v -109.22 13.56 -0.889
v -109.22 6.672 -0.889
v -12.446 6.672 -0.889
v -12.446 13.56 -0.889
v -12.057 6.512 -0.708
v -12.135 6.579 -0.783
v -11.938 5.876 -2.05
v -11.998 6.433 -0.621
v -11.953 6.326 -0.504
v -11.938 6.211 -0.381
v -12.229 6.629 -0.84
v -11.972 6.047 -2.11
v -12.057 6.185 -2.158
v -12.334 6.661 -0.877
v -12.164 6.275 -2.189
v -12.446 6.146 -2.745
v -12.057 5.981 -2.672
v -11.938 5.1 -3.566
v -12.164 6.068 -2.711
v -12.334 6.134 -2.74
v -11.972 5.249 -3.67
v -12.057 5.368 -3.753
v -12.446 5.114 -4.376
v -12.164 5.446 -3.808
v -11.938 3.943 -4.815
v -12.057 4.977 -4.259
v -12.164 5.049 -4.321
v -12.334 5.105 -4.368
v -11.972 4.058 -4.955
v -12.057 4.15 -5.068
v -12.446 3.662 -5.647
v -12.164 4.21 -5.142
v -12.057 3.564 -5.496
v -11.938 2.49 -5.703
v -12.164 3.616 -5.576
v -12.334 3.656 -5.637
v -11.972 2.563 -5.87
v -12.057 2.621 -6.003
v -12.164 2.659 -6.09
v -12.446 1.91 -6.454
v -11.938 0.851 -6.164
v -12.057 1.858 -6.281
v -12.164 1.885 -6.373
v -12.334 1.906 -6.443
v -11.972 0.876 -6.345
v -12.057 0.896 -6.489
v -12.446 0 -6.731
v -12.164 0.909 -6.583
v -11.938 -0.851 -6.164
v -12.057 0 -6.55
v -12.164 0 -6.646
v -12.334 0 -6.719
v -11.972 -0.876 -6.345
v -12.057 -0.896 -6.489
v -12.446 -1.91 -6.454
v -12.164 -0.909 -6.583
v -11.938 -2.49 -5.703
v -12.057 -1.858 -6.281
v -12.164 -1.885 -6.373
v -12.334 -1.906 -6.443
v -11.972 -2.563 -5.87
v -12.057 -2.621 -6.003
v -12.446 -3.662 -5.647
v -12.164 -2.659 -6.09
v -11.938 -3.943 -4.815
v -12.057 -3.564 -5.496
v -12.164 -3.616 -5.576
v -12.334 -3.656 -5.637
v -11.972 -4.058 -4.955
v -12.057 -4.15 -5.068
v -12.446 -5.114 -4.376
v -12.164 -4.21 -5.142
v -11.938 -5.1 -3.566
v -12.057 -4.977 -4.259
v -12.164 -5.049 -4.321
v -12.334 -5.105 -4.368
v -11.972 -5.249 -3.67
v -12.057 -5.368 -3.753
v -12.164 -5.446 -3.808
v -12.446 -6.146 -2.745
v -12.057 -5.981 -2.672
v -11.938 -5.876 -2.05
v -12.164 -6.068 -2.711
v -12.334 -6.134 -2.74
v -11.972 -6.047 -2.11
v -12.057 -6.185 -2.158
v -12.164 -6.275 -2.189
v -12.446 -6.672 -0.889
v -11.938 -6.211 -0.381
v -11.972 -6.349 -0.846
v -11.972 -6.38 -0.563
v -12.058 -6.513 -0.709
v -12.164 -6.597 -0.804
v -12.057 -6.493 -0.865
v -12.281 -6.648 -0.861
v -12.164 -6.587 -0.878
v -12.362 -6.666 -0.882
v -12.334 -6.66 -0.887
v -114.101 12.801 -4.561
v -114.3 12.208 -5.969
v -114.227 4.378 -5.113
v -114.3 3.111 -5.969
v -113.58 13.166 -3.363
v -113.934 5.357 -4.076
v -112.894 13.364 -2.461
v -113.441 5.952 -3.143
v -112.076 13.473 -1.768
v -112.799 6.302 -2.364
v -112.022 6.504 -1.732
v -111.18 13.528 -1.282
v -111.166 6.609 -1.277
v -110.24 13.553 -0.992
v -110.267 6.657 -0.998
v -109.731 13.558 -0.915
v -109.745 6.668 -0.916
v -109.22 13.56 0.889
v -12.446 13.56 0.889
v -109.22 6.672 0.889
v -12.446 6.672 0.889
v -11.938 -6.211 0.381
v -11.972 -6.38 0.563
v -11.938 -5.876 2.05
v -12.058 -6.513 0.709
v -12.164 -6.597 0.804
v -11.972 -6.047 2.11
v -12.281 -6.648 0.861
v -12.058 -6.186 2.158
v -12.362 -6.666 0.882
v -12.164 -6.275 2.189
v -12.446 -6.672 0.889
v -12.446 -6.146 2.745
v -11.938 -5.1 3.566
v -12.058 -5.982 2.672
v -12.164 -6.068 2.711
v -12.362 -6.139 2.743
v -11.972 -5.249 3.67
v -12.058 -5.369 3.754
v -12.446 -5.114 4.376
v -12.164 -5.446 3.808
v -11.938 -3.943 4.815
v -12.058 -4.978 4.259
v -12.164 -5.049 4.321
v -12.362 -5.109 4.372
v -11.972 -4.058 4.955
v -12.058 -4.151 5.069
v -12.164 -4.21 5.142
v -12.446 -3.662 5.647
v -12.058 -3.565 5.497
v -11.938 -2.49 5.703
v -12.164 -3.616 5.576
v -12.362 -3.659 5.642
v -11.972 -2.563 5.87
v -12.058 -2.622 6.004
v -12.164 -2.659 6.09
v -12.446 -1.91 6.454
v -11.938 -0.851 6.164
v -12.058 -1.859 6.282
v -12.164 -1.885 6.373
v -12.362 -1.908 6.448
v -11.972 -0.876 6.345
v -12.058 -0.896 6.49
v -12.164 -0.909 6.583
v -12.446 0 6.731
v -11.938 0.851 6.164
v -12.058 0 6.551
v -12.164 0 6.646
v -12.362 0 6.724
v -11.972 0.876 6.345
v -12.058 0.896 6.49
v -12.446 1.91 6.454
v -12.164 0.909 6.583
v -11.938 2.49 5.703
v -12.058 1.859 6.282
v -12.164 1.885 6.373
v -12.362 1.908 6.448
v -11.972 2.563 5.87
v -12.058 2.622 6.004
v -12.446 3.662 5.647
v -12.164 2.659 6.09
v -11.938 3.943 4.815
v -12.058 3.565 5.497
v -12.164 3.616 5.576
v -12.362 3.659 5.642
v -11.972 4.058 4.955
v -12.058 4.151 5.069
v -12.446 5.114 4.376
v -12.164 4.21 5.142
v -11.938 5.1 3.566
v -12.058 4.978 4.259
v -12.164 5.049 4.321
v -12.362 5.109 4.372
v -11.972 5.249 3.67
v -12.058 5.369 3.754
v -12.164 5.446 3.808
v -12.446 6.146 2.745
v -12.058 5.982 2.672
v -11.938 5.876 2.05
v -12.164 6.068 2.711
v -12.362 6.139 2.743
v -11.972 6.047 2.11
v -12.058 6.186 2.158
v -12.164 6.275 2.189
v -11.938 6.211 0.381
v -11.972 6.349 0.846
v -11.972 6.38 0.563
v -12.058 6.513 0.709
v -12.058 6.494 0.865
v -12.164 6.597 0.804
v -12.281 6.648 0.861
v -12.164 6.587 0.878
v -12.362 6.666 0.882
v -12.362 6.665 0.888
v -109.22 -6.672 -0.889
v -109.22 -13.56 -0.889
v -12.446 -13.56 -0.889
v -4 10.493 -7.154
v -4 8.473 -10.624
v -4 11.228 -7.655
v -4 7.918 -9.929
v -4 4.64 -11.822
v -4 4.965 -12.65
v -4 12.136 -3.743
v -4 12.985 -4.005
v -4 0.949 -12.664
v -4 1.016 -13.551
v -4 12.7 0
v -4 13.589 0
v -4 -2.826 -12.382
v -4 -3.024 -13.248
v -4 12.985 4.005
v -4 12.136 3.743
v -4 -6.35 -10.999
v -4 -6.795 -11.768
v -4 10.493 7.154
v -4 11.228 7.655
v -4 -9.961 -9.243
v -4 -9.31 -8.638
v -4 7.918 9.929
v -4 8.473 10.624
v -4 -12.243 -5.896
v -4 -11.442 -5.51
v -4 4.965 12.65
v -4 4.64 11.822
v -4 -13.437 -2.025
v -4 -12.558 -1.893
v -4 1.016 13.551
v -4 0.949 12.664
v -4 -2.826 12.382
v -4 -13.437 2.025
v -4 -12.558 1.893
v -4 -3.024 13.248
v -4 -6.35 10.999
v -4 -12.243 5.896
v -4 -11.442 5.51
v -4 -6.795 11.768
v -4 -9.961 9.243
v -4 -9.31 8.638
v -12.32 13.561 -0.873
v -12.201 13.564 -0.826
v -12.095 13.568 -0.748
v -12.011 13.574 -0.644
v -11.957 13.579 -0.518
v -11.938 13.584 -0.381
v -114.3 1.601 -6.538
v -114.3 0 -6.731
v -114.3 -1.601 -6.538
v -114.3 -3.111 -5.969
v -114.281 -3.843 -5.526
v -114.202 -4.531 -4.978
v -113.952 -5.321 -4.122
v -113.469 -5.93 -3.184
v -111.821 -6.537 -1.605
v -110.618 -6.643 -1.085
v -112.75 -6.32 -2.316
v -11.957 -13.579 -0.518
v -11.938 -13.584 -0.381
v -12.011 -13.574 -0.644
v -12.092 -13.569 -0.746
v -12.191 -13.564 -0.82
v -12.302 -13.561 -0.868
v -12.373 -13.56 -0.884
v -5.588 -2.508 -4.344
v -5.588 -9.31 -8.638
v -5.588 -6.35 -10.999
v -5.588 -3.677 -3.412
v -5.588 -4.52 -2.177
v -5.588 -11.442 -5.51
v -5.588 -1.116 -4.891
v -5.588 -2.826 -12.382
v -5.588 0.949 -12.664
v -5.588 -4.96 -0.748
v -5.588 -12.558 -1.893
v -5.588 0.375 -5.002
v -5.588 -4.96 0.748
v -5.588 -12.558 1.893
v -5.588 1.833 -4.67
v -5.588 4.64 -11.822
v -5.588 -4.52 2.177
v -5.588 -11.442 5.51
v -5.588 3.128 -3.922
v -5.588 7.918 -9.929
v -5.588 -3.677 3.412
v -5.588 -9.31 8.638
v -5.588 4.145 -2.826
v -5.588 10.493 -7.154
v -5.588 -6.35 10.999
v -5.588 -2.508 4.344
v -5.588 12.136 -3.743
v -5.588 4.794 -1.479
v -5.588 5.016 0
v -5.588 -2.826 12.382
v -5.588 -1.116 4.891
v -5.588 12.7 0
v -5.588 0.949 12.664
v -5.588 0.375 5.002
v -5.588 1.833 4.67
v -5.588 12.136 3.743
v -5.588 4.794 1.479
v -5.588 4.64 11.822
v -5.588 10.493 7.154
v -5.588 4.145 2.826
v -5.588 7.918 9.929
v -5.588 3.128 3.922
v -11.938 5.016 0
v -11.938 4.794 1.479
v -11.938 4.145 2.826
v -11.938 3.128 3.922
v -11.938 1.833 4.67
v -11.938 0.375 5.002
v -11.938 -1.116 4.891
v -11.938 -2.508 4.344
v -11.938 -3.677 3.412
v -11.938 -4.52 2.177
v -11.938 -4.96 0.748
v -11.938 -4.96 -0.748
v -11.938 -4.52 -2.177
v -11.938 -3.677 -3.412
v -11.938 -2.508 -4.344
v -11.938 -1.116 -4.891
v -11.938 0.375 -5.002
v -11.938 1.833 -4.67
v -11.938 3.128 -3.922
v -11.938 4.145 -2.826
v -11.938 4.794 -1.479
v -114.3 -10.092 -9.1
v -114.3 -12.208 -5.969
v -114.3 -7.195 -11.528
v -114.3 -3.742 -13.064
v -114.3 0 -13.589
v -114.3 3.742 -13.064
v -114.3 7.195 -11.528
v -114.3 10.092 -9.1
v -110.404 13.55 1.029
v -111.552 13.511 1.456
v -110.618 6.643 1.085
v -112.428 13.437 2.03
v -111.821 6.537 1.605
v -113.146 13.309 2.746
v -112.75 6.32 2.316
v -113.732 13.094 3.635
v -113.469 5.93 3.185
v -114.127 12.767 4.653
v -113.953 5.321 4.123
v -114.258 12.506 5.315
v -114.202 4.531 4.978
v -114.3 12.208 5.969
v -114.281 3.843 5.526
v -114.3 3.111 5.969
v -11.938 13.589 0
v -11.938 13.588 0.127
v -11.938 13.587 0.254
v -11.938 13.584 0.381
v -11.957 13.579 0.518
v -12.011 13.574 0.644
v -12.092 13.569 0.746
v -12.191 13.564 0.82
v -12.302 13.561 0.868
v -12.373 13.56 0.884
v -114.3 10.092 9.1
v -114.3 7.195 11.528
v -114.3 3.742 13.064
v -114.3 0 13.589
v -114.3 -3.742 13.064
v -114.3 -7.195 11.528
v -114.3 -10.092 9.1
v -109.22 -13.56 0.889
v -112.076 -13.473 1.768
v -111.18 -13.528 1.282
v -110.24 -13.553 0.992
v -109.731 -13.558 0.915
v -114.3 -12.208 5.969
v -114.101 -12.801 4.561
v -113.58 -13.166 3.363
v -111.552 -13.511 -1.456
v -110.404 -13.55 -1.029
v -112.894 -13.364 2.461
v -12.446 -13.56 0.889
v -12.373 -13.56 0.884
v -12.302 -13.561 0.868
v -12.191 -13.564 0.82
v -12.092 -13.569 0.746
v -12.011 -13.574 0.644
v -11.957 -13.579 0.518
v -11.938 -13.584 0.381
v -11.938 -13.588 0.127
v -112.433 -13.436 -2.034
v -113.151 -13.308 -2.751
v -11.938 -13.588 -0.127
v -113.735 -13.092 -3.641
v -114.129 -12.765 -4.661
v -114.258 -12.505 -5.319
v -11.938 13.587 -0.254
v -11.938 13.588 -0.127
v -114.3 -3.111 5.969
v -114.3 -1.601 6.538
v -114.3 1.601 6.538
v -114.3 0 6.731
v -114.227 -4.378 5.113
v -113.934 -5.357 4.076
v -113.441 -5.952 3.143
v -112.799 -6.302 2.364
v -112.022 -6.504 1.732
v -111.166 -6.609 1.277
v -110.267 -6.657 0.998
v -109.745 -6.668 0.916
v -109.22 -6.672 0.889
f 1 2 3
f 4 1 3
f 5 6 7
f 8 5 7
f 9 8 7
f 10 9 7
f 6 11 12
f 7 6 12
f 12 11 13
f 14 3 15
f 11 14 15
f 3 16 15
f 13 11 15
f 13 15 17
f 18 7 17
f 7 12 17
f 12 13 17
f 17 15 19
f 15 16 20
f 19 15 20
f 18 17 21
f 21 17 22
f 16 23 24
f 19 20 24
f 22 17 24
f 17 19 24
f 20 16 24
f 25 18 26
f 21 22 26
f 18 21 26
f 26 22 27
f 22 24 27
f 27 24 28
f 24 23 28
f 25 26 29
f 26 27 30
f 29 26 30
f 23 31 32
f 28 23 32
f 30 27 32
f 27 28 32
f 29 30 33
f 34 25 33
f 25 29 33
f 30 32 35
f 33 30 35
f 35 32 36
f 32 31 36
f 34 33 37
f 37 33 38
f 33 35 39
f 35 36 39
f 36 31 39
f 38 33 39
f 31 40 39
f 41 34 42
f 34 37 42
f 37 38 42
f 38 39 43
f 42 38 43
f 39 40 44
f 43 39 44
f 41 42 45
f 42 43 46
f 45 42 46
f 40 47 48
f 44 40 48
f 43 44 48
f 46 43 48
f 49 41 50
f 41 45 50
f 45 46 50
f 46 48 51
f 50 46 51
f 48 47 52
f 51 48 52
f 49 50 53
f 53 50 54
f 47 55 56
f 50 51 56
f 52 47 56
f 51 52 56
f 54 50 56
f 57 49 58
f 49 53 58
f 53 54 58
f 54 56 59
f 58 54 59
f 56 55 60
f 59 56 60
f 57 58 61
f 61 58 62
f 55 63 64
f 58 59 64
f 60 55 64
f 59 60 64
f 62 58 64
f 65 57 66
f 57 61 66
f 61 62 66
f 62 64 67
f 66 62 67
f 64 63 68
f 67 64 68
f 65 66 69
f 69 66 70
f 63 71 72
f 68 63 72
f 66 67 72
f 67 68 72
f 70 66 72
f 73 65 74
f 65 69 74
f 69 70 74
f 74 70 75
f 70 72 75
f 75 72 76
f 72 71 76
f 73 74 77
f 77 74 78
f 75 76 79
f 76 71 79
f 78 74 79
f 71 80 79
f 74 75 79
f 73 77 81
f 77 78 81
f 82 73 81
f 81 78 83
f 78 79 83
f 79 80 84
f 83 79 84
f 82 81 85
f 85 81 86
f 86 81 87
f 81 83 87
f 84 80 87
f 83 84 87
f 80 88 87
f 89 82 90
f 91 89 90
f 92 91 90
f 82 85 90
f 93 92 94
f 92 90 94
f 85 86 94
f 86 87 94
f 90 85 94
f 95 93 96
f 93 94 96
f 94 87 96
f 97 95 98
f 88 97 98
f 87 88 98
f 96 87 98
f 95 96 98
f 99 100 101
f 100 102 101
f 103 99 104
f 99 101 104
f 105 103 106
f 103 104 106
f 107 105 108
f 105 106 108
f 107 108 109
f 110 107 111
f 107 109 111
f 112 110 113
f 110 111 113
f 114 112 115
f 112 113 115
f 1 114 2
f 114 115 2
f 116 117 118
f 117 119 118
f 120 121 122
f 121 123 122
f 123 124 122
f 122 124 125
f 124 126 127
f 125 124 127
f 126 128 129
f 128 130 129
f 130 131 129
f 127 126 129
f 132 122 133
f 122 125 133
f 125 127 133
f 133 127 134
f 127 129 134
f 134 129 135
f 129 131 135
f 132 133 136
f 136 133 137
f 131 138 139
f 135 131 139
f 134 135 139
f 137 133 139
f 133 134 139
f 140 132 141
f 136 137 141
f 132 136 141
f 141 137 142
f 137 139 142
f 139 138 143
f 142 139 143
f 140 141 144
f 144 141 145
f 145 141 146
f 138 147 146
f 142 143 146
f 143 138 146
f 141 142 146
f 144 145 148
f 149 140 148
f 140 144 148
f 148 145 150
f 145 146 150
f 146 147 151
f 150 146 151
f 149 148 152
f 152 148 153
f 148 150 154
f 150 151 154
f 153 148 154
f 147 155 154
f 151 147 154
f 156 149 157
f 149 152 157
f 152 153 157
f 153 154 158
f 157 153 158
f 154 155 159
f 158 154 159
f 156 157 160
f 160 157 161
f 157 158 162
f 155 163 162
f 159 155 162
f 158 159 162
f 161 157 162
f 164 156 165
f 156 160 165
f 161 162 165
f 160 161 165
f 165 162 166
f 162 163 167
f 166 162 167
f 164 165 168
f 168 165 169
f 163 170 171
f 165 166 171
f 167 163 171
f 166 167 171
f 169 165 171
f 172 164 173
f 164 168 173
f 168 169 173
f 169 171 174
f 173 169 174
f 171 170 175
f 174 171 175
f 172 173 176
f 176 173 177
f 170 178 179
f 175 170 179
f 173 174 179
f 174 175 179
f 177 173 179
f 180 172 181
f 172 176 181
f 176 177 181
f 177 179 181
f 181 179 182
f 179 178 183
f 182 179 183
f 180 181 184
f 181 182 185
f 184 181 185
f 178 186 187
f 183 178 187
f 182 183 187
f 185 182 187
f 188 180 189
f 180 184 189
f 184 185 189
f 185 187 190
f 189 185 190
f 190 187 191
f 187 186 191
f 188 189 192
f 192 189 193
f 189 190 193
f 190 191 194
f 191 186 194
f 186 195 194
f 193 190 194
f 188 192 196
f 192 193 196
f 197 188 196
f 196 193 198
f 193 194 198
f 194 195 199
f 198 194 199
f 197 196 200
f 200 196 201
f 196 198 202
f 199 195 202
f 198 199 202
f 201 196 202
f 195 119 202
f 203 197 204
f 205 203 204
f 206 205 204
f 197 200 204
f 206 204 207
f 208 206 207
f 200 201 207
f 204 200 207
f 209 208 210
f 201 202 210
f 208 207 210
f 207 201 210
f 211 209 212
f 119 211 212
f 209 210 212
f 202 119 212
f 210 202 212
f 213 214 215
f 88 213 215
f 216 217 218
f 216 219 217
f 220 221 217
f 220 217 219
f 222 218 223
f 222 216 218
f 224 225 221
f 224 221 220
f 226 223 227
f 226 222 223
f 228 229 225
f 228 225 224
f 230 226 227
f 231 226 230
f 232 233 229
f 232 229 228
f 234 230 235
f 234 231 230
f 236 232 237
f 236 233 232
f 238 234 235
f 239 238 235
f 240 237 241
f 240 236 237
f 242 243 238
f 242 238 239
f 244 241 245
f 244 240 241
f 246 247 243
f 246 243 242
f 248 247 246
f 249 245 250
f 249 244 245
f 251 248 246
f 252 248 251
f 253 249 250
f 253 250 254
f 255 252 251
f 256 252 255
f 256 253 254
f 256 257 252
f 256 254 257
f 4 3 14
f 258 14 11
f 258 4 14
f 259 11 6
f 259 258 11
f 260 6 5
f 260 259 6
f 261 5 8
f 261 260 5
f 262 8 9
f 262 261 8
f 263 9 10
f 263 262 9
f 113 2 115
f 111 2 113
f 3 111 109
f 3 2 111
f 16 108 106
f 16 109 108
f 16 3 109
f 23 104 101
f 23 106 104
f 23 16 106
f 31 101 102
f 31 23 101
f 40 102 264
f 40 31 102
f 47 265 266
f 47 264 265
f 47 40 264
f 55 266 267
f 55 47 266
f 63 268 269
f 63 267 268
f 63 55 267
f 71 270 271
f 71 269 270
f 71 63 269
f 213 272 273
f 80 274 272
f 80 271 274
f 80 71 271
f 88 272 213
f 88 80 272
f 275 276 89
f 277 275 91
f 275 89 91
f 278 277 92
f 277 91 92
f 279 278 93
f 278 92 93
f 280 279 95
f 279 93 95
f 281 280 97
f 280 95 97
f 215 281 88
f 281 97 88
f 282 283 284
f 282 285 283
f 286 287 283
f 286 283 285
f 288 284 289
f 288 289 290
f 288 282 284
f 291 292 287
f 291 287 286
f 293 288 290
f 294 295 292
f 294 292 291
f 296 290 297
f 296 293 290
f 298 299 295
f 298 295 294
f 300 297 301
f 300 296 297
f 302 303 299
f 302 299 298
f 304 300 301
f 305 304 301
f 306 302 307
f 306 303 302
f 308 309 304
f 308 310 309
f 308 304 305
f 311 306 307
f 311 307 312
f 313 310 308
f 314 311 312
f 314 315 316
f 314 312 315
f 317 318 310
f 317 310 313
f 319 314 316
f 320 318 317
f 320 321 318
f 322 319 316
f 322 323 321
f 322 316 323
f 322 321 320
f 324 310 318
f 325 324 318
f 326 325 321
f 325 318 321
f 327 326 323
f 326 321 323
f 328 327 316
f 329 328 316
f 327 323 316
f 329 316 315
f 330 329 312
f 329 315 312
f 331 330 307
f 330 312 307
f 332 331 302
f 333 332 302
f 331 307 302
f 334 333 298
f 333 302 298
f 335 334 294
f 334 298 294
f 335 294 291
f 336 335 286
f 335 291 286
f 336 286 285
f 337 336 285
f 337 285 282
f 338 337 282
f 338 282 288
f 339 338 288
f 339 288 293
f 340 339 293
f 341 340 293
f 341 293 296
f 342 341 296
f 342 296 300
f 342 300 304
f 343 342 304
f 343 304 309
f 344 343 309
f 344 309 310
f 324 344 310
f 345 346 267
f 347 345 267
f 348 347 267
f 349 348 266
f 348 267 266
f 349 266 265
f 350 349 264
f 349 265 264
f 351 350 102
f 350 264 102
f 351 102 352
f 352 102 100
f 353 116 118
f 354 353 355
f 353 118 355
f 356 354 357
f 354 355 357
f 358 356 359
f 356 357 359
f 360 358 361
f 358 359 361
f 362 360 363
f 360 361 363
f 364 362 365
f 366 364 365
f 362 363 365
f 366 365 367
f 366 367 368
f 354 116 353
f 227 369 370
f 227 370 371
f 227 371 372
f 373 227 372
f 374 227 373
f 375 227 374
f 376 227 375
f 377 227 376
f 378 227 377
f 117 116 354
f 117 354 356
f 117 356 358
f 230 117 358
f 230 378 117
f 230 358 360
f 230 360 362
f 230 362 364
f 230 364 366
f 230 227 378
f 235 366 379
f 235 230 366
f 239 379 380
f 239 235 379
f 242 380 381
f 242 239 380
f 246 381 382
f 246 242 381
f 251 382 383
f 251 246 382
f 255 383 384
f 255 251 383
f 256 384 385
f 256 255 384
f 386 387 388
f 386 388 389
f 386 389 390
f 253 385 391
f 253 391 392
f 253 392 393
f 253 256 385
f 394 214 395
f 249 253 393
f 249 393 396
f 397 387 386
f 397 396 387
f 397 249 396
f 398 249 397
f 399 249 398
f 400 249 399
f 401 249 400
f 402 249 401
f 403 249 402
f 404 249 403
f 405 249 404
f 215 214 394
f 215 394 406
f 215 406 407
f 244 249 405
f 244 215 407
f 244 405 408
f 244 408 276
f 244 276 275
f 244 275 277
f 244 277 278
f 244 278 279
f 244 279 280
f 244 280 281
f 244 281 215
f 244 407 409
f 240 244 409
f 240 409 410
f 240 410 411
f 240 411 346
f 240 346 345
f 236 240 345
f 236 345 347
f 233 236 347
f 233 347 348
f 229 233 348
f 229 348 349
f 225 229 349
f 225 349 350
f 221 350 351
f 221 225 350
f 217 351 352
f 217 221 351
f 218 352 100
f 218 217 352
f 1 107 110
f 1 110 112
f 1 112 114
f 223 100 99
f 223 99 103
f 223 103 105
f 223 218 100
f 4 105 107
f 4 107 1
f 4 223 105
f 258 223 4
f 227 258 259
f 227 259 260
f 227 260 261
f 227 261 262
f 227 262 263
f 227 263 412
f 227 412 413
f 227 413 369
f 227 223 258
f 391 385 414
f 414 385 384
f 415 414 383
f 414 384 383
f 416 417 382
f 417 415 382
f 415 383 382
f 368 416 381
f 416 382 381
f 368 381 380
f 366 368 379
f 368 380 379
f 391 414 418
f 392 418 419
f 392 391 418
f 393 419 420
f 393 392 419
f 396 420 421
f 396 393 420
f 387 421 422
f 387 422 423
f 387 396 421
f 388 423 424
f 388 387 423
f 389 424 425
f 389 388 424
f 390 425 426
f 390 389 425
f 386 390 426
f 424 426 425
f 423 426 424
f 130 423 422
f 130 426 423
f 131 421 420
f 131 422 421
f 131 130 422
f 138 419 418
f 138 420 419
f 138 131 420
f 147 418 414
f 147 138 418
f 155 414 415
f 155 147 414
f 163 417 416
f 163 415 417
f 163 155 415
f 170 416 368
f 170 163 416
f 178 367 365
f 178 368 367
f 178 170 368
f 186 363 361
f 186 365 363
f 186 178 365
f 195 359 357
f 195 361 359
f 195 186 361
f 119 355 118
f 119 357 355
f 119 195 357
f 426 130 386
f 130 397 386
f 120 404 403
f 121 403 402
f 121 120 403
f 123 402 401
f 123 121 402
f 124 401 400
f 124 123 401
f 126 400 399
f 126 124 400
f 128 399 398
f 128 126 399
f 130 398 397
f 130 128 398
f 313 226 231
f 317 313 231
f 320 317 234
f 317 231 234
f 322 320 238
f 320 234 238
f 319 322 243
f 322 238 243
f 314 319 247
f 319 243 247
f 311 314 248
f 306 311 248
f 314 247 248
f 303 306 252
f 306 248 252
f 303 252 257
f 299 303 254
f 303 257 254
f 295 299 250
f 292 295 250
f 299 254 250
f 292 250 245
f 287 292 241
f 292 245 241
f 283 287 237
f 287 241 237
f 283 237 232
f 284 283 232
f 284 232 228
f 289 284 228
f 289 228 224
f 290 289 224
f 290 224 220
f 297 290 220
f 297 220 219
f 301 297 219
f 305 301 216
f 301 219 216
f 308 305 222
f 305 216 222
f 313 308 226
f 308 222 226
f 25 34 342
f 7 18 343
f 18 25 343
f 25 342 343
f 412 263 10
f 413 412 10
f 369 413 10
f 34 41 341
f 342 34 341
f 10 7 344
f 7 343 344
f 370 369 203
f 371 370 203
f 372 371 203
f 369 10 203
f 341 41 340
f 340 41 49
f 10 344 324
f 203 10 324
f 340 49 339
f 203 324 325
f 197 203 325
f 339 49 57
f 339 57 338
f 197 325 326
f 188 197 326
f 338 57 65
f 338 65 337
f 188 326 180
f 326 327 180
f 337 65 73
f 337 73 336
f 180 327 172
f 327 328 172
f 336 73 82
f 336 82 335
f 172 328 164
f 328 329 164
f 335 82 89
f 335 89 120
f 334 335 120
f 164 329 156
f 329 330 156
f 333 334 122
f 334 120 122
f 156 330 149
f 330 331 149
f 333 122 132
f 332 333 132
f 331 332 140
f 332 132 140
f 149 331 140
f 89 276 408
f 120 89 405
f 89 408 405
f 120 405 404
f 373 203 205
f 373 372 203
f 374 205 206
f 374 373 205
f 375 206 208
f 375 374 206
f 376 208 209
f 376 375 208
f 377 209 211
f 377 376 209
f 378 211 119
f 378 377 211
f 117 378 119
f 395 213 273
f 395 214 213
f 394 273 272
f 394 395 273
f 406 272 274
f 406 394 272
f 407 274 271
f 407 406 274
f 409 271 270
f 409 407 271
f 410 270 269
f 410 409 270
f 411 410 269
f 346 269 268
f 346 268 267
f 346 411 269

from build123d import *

# Parameters (mm, degrees)
F0_R      = 13.589
F1_DEPTH  = 114.3
F3_DEPTH  = 50.546
F4_R      = 5.0165
F5_DEPTH  = 152.4
F6_R      = 6.731
F7_DEPTH  = 106.934
F8_R      = 5.08
F9_R      = 0.508
F10_W     = 8.001
F10_H     = 42.073292
F11_DEPTH = 17.8308
F12_R     = 12.7
F13_DEPTH = 1.5875


with BuildPart() as f1:
    # F0 (on Right) → F1 (new body)
    with BuildSketch(Plane.YZ):
        Circle(F0_R)
    extrude(amount=-F1_DEPTH)

    # F2 (on Front) → F3 (cut, symmetric)
    with BuildSketch(Plane.XZ):
        Polygon((-11.938, 0.889), (-114.3, 0.889), (-114.3, -0.889), (-11.938, -0.889), (-11.938, 0), align=None)
    extrude(amount=F3_DEPTH, both=True, mode=Mode.SUBTRACT)

    # F4 (on face) → F5 (cut)
    with BuildSketch(Plane.YZ):
        Circle(F4_R)
    extrude(amount=-F5_DEPTH, mode=Mode.SUBTRACT)

    # F6 (on face) → F7 (cut)
    with BuildSketch(Plane(origin=(-11.938, 0, 0), x_dir=(0, -1, 0), z_dir=(-1, 0, 0))):
        Circle(F6_R)
    extrude(amount=F7_DEPTH, mode=Mode.SUBTRACT)

    # F8
    f8_edges = [f1.edges().sort_by_distance(p)[0] for p in [
        (-114.3, 10.115962, 0.889),
        (-114.3, -10.115962, 0.889),
        (-114.3, -10.115962, -0.889),
        (-114.3, 10.115962, -0.889),
    ]]
    fillet(f8_edges, radius=F8_R)

    # F9
    f9_edges = [f1.edges().sort_by_distance(p)[0] for p in [
        (-11.938, 10.115962, 0.889),
        (-11.938, -10.115962, 0.889),
        (-11.938, 10.115962, -0.889),
        (-11.938, -10.115962, -0.889),
        (-11.938, 0, 6.731),
        (-11.938, 0, -6.731),
    ]]
    fillet(f9_edges, radius=F9_R)

    # F10 (on Front) → F11 (cut, symmetric)
    with BuildSketch(Plane.XZ):
        Rectangle(F10_W, F10_H)
    extrude(amount=F11_DEPTH, both=True, mode=Mode.SUBTRACT)

    # F12 (on face) → F13 (cut)
    with BuildSketch(Plane.YZ.offset(-4.0005)):
        Circle(F12_R)
    extrude(amount=-F13_DEPTH, mode=Mode.SUBTRACT)


solid = f1.part
